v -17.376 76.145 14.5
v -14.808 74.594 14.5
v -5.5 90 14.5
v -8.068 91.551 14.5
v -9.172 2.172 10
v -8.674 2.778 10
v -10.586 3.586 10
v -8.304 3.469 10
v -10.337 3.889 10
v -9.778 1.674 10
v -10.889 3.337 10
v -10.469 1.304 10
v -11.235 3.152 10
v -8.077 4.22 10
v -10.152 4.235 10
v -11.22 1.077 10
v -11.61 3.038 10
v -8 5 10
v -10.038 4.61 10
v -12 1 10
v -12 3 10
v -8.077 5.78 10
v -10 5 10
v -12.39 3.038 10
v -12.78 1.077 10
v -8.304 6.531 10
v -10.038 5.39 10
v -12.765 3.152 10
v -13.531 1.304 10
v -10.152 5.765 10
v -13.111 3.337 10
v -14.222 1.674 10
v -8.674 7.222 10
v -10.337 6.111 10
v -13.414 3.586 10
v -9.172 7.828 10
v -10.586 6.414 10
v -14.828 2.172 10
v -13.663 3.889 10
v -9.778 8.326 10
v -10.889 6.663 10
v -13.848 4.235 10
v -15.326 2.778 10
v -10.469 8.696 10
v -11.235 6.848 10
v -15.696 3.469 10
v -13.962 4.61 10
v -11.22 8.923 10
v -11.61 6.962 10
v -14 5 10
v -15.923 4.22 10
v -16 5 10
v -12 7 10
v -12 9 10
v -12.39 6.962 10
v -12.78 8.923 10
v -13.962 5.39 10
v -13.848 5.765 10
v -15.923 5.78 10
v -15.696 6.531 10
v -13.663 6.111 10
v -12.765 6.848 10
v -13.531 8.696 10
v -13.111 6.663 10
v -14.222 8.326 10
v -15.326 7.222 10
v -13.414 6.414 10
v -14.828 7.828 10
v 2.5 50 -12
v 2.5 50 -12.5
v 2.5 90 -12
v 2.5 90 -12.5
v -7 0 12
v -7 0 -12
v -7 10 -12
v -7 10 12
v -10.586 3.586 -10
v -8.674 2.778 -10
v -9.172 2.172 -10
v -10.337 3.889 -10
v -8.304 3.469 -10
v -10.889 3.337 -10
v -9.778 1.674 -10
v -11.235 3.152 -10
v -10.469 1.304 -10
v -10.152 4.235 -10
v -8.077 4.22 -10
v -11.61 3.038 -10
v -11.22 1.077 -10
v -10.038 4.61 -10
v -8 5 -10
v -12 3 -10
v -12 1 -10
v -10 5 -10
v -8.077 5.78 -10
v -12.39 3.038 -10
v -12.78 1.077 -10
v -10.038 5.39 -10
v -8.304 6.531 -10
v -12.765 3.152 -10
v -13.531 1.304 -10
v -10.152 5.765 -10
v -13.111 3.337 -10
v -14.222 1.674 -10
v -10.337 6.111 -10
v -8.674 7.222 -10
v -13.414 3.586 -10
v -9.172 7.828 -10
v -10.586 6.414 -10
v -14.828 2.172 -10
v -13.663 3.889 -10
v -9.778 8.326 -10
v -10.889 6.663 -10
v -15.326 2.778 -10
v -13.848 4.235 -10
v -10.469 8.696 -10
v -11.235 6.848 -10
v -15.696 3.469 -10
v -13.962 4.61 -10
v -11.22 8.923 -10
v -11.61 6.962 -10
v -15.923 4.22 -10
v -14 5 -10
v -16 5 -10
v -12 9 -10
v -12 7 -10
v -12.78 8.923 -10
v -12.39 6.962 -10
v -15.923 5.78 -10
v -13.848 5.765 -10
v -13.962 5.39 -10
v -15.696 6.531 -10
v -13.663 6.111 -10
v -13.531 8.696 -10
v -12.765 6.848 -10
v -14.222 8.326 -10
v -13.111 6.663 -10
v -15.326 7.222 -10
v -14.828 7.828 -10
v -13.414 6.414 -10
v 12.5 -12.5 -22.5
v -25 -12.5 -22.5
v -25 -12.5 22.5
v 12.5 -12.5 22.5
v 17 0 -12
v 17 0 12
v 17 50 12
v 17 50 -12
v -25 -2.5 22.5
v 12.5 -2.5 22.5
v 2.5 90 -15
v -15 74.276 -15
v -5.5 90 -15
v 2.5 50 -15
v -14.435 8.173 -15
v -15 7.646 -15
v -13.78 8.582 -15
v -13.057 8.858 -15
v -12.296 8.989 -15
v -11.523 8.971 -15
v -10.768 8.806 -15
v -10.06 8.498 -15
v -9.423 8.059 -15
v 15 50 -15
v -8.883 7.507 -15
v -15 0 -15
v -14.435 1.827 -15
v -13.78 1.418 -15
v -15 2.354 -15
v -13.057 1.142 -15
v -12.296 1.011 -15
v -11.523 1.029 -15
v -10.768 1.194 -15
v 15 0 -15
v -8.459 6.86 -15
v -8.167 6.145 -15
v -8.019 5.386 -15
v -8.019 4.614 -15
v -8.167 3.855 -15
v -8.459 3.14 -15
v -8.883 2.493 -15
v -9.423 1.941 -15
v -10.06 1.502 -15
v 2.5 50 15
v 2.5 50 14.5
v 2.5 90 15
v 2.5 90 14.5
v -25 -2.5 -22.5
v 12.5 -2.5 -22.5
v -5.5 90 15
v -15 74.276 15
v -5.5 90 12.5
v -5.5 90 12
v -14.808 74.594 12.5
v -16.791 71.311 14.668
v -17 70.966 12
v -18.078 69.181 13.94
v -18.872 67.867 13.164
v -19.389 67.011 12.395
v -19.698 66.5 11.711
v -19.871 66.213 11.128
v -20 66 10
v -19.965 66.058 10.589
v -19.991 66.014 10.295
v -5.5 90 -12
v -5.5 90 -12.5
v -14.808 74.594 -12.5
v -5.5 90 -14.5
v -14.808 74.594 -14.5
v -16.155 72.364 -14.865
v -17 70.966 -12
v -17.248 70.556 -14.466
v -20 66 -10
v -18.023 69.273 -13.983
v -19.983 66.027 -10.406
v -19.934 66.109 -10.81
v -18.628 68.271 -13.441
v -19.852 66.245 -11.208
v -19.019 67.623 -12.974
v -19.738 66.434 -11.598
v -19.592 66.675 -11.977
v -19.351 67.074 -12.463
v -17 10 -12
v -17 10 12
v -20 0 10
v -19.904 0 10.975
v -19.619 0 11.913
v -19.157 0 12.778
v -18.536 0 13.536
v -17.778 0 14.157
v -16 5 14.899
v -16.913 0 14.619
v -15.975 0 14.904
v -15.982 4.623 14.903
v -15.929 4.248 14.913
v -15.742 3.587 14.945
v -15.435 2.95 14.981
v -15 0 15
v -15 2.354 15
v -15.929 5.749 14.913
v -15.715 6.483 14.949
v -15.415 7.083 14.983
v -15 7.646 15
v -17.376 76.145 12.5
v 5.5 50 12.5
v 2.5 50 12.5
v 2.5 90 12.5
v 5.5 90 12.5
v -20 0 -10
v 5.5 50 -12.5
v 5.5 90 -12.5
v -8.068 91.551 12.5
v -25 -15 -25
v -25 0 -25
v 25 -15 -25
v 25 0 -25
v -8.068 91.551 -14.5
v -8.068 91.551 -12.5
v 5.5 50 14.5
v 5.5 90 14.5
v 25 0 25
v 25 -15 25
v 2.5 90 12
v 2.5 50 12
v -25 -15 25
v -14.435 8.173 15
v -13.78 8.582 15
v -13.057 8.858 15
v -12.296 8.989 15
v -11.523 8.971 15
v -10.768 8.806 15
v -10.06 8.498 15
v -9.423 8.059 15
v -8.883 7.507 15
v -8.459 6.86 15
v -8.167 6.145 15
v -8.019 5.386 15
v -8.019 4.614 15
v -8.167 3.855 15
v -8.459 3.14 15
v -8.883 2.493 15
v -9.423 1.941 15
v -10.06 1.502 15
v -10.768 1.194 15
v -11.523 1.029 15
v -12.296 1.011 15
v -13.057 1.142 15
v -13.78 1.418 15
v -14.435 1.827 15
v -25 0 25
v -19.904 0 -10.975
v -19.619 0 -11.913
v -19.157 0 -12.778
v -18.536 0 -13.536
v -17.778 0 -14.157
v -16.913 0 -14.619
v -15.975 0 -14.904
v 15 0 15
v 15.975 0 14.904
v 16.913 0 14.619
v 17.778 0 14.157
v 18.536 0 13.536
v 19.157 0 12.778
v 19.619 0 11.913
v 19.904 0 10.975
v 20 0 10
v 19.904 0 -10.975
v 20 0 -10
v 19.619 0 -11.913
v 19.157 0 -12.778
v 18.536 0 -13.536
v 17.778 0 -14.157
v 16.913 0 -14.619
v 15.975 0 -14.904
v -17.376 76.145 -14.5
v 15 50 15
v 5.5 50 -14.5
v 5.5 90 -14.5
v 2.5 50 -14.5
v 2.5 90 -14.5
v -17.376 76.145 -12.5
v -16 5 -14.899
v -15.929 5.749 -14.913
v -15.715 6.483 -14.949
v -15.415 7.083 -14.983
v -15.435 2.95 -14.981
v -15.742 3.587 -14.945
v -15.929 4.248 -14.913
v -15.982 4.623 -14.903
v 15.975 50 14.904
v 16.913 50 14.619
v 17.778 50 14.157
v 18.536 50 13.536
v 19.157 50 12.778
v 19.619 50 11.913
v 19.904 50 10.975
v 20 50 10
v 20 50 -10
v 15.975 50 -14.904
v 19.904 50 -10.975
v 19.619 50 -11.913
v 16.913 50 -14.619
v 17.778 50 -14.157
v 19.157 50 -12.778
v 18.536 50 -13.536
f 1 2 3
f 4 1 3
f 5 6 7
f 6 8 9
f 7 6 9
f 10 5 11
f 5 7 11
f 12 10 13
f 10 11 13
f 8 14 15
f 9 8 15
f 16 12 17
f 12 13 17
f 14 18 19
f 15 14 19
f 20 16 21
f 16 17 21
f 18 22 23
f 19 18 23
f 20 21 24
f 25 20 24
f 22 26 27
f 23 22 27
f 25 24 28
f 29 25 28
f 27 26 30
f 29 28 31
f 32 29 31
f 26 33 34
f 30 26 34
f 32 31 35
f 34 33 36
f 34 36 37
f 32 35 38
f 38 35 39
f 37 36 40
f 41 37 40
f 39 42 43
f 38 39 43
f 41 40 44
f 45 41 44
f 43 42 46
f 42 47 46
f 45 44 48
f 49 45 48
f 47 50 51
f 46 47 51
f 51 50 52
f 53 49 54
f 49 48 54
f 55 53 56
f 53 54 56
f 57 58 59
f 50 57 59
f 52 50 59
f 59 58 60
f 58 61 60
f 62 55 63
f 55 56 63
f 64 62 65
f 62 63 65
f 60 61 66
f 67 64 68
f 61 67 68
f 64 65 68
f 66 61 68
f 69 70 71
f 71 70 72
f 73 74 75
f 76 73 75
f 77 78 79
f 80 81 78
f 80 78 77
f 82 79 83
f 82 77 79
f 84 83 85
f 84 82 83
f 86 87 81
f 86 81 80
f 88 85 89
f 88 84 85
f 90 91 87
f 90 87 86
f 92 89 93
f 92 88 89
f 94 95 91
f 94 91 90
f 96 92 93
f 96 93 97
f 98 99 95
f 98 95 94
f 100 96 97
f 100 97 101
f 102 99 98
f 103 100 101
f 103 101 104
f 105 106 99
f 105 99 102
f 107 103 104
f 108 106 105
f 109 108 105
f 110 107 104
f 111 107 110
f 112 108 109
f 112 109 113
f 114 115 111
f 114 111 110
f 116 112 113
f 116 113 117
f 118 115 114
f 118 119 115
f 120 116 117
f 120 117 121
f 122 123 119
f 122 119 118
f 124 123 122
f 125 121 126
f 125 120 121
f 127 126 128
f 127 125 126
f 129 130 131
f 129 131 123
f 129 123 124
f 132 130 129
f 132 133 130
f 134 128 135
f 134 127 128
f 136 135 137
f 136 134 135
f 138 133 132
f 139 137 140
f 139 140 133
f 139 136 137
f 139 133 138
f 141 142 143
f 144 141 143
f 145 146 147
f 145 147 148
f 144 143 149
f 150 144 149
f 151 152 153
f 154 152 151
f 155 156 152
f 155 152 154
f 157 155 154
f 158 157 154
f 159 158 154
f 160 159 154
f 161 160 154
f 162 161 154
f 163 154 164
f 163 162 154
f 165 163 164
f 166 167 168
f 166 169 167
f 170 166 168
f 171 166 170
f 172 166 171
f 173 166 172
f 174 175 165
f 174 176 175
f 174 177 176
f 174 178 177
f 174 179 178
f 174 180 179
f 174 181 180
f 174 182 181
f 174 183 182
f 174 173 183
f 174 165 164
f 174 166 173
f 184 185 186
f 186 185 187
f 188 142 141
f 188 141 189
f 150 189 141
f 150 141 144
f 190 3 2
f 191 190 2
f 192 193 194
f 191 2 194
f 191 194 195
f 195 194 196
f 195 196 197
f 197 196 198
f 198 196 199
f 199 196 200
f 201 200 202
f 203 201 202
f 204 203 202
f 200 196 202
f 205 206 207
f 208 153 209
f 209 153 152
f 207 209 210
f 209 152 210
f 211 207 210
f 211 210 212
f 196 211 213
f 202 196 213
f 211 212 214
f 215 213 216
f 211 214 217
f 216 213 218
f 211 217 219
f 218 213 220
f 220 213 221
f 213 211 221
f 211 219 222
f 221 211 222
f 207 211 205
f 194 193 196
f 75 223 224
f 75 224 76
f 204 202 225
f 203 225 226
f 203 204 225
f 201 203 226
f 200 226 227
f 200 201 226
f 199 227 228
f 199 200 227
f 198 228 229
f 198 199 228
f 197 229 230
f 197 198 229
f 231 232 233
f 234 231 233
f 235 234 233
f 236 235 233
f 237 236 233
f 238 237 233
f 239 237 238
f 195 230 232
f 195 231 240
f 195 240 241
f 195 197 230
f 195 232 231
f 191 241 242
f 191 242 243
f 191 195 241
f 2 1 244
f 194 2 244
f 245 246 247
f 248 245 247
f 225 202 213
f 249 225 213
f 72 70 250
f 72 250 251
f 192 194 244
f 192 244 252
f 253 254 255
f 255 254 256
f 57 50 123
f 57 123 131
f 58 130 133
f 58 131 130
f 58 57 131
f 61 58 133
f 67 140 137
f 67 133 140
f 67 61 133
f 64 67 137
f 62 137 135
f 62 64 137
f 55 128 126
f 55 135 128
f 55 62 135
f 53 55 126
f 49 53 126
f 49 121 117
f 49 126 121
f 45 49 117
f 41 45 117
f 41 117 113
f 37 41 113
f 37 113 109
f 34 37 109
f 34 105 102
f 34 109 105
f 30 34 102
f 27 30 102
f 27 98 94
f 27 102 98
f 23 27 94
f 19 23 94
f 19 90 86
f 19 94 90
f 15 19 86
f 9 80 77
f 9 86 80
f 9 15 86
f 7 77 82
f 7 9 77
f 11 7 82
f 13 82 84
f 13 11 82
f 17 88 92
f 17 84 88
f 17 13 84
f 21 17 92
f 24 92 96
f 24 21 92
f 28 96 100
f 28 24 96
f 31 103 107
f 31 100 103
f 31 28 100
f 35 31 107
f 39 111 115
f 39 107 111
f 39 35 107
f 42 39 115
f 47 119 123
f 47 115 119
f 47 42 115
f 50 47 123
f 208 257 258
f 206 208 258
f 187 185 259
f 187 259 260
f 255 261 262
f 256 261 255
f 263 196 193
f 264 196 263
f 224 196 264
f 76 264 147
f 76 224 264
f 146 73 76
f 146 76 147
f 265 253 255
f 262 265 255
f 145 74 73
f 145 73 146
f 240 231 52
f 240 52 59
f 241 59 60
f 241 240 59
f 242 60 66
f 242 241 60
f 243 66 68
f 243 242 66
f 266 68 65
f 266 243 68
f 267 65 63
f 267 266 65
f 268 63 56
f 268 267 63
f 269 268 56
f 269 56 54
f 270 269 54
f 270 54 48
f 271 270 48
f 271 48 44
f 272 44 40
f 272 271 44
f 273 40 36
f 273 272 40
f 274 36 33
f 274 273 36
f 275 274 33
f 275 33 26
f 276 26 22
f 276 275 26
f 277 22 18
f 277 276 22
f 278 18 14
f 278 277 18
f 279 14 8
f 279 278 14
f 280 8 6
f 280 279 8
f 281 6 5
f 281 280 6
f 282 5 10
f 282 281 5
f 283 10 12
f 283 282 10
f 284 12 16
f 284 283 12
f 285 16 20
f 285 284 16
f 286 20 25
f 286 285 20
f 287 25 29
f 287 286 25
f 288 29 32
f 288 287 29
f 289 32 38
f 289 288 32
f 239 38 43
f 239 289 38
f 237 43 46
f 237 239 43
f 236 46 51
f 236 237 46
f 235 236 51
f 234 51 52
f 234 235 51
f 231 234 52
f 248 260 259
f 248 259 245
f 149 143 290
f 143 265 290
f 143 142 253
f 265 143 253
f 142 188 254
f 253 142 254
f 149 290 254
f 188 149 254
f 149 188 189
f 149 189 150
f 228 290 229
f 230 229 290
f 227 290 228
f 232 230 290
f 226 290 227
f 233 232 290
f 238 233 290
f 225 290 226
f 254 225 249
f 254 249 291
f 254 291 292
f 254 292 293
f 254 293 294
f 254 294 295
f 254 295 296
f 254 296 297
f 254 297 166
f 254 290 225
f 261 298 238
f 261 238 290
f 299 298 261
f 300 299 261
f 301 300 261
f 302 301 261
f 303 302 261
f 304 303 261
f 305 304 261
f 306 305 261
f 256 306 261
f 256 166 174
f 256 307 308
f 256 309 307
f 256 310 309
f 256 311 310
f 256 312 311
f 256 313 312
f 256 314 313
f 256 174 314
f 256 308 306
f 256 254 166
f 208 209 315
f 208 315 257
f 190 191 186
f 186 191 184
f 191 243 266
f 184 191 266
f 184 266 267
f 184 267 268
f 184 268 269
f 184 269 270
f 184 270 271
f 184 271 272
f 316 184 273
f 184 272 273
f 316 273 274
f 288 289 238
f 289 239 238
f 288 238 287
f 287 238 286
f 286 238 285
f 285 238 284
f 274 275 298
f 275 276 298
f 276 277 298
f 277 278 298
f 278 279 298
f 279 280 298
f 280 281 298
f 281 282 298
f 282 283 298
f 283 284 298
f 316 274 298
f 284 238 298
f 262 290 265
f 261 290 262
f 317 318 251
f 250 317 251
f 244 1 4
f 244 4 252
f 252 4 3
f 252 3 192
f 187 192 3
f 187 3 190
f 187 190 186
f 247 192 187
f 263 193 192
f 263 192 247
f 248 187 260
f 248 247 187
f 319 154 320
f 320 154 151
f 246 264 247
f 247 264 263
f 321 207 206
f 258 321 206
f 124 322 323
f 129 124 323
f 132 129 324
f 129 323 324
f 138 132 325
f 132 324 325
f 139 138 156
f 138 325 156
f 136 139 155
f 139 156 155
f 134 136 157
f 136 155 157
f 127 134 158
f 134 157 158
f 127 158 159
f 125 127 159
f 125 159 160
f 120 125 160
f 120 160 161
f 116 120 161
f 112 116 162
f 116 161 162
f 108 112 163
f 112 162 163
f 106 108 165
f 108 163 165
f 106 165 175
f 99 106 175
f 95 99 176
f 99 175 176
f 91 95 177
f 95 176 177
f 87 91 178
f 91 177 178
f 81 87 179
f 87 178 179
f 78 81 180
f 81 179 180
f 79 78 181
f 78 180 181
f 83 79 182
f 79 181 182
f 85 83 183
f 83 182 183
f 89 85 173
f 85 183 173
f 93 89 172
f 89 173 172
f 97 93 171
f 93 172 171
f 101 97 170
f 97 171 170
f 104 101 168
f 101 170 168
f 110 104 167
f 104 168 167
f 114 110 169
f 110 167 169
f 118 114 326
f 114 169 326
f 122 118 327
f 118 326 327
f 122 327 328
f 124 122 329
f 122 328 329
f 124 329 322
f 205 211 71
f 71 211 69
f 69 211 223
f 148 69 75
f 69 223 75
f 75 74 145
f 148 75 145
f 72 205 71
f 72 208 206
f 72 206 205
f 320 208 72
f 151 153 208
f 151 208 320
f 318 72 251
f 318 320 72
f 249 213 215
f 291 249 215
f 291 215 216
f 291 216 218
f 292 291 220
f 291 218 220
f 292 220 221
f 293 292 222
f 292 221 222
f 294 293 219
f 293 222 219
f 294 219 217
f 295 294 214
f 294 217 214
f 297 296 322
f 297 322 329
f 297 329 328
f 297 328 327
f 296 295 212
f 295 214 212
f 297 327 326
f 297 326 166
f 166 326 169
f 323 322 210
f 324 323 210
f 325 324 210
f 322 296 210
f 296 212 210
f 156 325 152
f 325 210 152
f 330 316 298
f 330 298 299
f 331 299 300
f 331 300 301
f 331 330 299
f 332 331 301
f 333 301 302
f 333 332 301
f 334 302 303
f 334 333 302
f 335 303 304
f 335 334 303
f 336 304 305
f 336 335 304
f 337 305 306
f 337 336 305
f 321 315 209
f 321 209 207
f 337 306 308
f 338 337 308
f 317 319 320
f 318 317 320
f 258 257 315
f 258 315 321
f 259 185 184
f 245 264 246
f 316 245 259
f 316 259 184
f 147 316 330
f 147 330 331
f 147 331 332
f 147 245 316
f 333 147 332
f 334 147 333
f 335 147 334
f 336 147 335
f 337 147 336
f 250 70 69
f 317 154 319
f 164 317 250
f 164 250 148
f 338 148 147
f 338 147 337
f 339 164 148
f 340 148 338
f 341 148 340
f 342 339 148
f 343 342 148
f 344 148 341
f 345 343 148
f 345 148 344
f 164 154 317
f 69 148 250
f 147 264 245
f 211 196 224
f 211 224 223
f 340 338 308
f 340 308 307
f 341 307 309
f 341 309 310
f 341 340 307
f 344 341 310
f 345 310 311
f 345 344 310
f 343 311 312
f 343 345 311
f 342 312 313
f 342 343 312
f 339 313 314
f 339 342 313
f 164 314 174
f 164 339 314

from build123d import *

# Parameters (mm, degrees)
SKETCH1_W               = 40
SKETCH1_H               = 30
BOSS_EXTRUDE1_DEPTH     = 90
SHELL1_T                = -3
FILLET1_R               = 5
CUT_EXTRUDE1_DEPTH      = 94.407708461
CUT_EXTRUDE1_DEPTH_BACK = 94.407708461
CUT_EXTRUDE2_DEPTH      = 94.407708461
CUT_EXTRUDE2_DEPTH_BACK = 94.407708461
SKETCH3_W               = 17.5
SKETCH3_H               = 40
SKETCH5_W               = 2
SKETCH5_H               = 40
BOSS_EXTRUDE2_DEPTH     = 3
SKETCH6_W               = 2
SKETCH6_H               = 18
BOSS_EXTRUDE3_DEPTH     = 3
SKETCH8_W               = 50
SKETCH8_H               = 50
BOSS_EXTRUDE4_DEPTH     = 15
SKETCH10_W              = 45
SKETCH10_H              = 10
CUT_EXTRUDE4_DEPTH      = 37.5
BOSS_EXTRUDE5_REACH     = 103.861
SKETCH15_W              = 10
SKETCH15_H              = 10
CUT_EXTRUDE8_DEPTH      = 103.988587343
CUT_EXTRUDE8_DEPTH_BACK = 103.988587343
SKETCH20_R              = 2
SKETCH21_R              = 4
CUT_EXTRUDE9_DEPTH      = 5


with BuildPart() as part:
    # Sketch1 → Boss-Extrude1 (new body)
    with BuildSketch(Plane(origin=(0, 0, 0), x_dir=(1, 0, 0), z_dir=(0, 1, 0))):
        Rectangle(SKETCH1_W, SKETCH1_H)
    extrude(amount=BOSS_EXTRUDE1_DEPTH)

    # Shell1
    shell1_openings = [part.faces().sort_by_distance(p)[0] for p in [
        (0, 90, 0),
        (0, 0, 0),
    ]]
    offset(amount=SHELL1_T, openings=shell1_openings, kind=Kind.INTERSECTION)

    # Fillet1
    fillet1_edges = [part.edges().sort_by_distance(p)[0] for p in [
        (20, 45, 15),
        (-20, 45, 15),
        (-20, 45, -15),
        (20, 45, -15),
    ]]
    fillet(fillet1_edges, radius=FILLET1_R)

    # Sketch2 → Cut-Extrude1 (cut, two sides: drawn at the far end of the back side and taken through both)
    with BuildSketch(Plane.XY.offset(-CUT_EXTRUDE1_DEPTH_BACK)):
        Polygon((-5.5, 90), (-20, 66), (-20, 90), align=None)
    extrude(amount=CUT_EXTRUDE1_DEPTH + CUT_EXTRUDE1_DEPTH_BACK, mode=Mode.SUBTRACT)

    # Sketch3 → Cut-Extrude2 (cut, two sides: drawn at the far end of the back side and taken through both)
    with BuildSketch(Plane.XY.offset(-CUT_EXTRUDE2_DEPTH_BACK)):
        with Locations((11.25, 70)):
            Rectangle(SKETCH3_W, SKETCH3_H)
    extrude(amount=CUT_EXTRUDE2_DEPTH + CUT_EXTRUDE2_DEPTH_BACK, mode=Mode.SUBTRACT)

    # Sketch5 → Boss-Extrude2 (add)
    with BuildSketch(Plane(origin=(2.5, 0, 0), x_dir=(0, 0, -1), z_dir=(1, 0, 0))):
        with Locations((-13.5, 70)):
            Rectangle(SKETCH5_W, SKETCH5_H)
    boss_extrude2 = extrude(amount=BOSS_EXTRUDE2_DEPTH)

    # Mirror1: Boss-Extrude2 across plane
    add(boss_extrude2.mirror(Plane.XY))

    # Sketch6 → Boss-Extrude3 (add)
    with BuildSketch(Plane(origin=(-43.86391097, 26.501112878, 0), x_dir=(0, 0, 1), z_dir=(-0.8559155419457907, 0.5171156399255815, 0))):
        with Locations((-13.5, 65.188262756)):
            Rectangle(SKETCH6_W, SKETCH6_H)
    boss_extrude3 = extrude(amount=BOSS_EXTRUDE3_DEPTH)

    # Mirror2: Boss-Extrude3 across plane
    add(boss_extrude3.mirror(Plane.XY))

    # Sketch8 → Boss-Extrude4 (add)
    with BuildSketch(Plane(origin=(0, 0, 0), x_dir=(1, 0, 0), z_dir=(0, 1, 0))):
        Rectangle(SKETCH8_W, SKETCH8_H)
    extrude(amount=-BOSS_EXTRUDE4_DEPTH)

    # Sketch10 → Cut-Extrude4 (cut)
    with BuildSketch(Plane.ZY.offset(25)):
        with Locations((0, -7.5)):
            Rectangle(SKETCH10_W, SKETCH10_H)
    extrude(amount=-CUT_EXTRUDE4_DEPTH, mode=Mode.SUBTRACT)

    # Sketch15 → Boss-Extrude5 (add, up to next)
    with BuildSketch(Plane.XY.offset(-12), mode=Mode.PRIVATE) as boss_extrude5_sk1:
        with Locations((-12, 5)):
            Rectangle(SKETCH15_W, SKETCH15_H)
    boss_extrude5_tool1 = extrude(boss_extrude5_sk1.sketch, amount=BOSS_EXTRUDE5_REACH, mode=Mode.PRIVATE) - part.part
    add(boss_extrude5_tool1.solids().sort_by_distance((-12, 5, -12))[0])

    # Sketch20 → Cut-Extrude8 (cut, two sides: drawn at the far end of the back side and taken through both)
    with BuildSketch(Plane(origin=(0, 0, -15), x_dir=(-1, 0, 0), z_dir=(0, 0, -1)).offset(-CUT_EXTRUDE8_DEPTH_BACK)):
        with Locations((12, 5)):
            Circle(SKETCH20_R)
    extrude(amount=CUT_EXTRUDE8_DEPTH + CUT_EXTRUDE8_DEPTH_BACK, mode=Mode.SUBTRACT)

    # Sketch21 → Cut-Extrude9 (cut)
    with BuildSketch(Plane(origin=(0, 0, -15), x_dir=(-1, 0, 0), z_dir=(0, 0, -1))):
        with Locations((12, 5)):
            Circle(SKETCH21_R)
    cut_extrude9 = extrude(amount=-CUT_EXTRUDE9_DEPTH, mode=Mode.SUBTRACT)

    # Mirror3: Cut-Extrude9 across plane
    add(cut_extrude9.mirror(Plane.XY), mode=Mode.SUBTRACT)


solid = part.part
